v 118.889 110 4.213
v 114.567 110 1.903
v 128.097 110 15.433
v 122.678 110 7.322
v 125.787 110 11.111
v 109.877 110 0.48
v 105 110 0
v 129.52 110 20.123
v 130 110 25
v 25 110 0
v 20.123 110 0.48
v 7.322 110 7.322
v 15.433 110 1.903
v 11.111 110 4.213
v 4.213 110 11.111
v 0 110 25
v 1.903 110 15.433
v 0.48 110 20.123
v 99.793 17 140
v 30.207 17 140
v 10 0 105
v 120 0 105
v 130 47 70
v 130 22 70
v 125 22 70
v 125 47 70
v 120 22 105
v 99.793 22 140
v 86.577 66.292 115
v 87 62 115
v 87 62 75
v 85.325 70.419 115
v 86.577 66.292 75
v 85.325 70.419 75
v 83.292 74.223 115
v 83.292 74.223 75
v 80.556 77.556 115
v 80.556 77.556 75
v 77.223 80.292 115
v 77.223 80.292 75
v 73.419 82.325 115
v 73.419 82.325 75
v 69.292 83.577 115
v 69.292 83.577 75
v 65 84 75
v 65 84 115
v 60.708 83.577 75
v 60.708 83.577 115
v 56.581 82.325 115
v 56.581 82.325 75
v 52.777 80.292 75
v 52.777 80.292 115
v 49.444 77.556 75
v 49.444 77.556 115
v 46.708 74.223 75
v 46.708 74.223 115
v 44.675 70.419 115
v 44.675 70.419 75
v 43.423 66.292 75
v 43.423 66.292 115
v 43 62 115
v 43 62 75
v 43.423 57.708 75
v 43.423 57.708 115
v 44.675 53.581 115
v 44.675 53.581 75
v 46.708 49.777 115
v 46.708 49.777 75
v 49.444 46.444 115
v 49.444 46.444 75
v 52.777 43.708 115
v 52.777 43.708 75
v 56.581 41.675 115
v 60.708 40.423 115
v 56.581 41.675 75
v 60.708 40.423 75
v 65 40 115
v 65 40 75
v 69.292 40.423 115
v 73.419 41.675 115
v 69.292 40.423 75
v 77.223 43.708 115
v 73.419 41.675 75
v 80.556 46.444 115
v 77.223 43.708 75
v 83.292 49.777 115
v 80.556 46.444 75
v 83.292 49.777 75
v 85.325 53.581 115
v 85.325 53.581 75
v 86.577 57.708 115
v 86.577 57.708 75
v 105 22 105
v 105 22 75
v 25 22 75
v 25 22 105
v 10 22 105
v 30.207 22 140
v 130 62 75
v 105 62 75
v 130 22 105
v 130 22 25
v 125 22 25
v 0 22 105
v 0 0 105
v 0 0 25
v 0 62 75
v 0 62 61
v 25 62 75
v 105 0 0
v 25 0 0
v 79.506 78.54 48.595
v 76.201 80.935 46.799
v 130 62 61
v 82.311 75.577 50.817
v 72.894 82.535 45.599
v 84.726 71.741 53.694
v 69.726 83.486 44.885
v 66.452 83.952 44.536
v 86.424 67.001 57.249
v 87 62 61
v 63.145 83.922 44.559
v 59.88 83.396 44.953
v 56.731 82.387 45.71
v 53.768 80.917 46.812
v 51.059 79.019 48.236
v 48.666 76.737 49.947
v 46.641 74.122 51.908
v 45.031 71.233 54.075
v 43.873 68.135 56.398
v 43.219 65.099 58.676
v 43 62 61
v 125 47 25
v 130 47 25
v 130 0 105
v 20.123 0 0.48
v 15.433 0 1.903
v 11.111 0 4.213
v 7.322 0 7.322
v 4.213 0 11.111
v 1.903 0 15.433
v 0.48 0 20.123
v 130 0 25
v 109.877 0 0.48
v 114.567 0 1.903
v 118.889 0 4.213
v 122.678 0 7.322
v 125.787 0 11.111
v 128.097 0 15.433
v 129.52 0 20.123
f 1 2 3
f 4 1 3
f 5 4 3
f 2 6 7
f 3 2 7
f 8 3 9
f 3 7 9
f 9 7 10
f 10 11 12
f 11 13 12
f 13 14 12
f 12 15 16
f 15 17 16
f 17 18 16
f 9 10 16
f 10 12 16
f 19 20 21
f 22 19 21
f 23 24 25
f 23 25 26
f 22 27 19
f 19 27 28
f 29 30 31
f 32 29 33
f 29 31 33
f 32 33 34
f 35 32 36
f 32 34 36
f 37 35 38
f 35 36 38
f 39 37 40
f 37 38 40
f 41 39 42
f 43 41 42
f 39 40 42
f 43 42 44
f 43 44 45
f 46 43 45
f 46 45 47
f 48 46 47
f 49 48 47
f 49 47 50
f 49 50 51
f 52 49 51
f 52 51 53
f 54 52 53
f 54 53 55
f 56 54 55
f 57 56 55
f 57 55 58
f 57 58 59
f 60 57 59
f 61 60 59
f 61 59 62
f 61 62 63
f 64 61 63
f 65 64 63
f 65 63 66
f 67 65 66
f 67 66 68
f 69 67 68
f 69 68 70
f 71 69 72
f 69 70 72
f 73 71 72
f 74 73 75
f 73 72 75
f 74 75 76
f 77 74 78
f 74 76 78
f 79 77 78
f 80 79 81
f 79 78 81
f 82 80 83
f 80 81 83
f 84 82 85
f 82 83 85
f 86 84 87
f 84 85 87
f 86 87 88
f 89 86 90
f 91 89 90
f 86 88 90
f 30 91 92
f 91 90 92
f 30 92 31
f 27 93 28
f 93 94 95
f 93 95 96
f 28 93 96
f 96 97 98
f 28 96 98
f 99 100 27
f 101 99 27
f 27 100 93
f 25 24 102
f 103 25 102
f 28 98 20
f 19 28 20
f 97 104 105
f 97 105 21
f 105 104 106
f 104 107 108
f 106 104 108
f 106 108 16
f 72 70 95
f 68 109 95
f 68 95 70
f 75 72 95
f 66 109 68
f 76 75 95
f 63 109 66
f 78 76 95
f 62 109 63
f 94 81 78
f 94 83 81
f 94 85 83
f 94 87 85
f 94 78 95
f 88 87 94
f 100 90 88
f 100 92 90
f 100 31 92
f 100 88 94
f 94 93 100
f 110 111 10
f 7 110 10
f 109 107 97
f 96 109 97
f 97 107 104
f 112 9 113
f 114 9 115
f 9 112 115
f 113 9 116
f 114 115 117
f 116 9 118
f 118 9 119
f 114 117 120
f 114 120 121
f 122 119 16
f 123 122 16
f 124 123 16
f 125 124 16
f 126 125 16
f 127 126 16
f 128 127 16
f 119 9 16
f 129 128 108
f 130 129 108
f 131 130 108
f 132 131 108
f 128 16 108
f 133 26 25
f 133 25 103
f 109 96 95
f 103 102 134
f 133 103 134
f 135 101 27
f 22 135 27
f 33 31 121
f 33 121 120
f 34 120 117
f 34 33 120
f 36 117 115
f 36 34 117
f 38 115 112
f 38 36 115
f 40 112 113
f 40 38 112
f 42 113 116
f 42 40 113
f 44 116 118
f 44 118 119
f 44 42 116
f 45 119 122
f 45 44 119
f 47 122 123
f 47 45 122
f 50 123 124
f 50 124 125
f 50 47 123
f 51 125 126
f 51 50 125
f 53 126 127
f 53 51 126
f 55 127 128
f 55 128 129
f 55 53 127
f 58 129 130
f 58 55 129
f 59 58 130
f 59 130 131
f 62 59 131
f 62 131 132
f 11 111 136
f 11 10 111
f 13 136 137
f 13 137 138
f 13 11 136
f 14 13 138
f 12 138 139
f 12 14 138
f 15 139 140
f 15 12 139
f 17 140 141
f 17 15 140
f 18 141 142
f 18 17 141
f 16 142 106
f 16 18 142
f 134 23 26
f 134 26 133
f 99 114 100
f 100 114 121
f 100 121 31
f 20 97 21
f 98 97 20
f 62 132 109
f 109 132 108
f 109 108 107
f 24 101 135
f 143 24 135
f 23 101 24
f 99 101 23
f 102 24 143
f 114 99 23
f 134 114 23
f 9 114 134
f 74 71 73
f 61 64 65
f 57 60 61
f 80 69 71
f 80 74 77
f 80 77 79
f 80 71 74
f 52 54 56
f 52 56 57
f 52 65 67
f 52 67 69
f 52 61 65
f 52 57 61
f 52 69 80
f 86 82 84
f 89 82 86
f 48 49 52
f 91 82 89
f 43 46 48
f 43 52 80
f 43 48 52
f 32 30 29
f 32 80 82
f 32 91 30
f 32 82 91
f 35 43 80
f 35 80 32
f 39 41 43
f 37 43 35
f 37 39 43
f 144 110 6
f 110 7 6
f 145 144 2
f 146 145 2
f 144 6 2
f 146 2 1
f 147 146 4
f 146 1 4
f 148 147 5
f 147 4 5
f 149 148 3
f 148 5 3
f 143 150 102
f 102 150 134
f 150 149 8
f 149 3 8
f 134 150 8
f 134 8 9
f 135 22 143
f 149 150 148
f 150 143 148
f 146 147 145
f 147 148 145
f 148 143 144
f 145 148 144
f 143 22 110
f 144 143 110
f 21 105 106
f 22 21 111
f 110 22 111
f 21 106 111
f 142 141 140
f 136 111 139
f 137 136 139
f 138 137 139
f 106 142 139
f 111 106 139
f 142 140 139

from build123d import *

# Parameters (mm, degrees)
EXTRUDE1_DEPTH             = 130
FILLET1_R                  = 25
EXTRUDE2_DEPTH             = 130
SKETCH3_W                  = 45
SKETCH3_H                  = 25
EXTRUDE3_DEPTH             = 5
SKETCH4_W                  = 80
SKETCH4_H                  = 30
EXTRUDE4_DEPTH             = 40
SKETCH5_R                  = 22
EXTRUDE5_DEPTH             = 40
EXTRUDE5_DIRECTION_2_REACH = 77


with BuildPart() as part:
    # Sketch1 → Extrude1 (new body)
    with BuildSketch(Plane(origin=(0, 0, 0), x_dir=(0, 0, -1), z_dir=(1, 0, 0))):
        Polygon((0, 0), (0, 110), (-25, 110), (-61, 62), (-75, 62), (-105, 22), (-140, 22), (-140, 17), (-105, 0), align=None)
    extrude(amount=EXTRUDE1_DEPTH)

    # Fillet1
    fillet1_edges = [part.edges().sort_by_distance(p)[0] for p in [
        (0, 55, 0),
        (130, 55, 0),
    ]]
    fillet(fillet1_edges, radius=FILLET1_R)

    # Sketch2 → Extrude2 (cut)
    with BuildSketch(Plane(origin=(0, 22, 0), x_dir=(1, 0, 0), z_dir=(0, 1, 0))):
        Polygon((99.792740578, -140), (130, -140), (130, -105), (120, -105), align=None)
        Polygon((10, -105), (30.207259422, -140), (0, -140), (0, -105), align=None)
    extrude(amount=-EXTRUDE2_DEPTH, mode=Mode.SUBTRACT)

    # Sketch3 → Extrude3 (cut)
    with BuildSketch(Plane(origin=(130, 0, 0), x_dir=(0, 0, -1), z_dir=(1, 0, 0))):
        with Locations((-47.5, 34.5)):
            Rectangle(SKETCH3_W, SKETCH3_H)
    extrude(amount=-EXTRUDE3_DEPTH, mode=Mode.SUBTRACT)

    # Sketch4 → Extrude4 (cut)
    with BuildSketch(Plane(origin=(0, 62, 0), x_dir=(1, 0, 0), z_dir=(0, 1, 0))):
        with Locations((65, -90)):
            Rectangle(SKETCH4_W, SKETCH4_H)
    extrude(amount=-EXTRUDE4_DEPTH, mode=Mode.SUBTRACT)

    # Sketch5 → Extrude5 (add)
    with BuildSketch(Plane.XY.offset(75)):
        with Locations((65, 62)):
            Circle(SKETCH5_R)
    extrude(amount=EXTRUDE5_DEPTH)

    # Extrude5 direction 2: up to this face of the body (flat: up to its plane)
    extrude5_direction_2_end = Plane(part.part.faces().sort_by_distance((65, 86, 43))[0])
    # Sketch5 → Extrude5 direction 2 (add, up to the picked face)
    with BuildSketch(Plane.XY.offset(75), mode=Mode.PRIVATE) as extrude5_direction_2_sk1:
        with Locations((65, 62)):
            Circle(SKETCH5_R)
    extrude5_direction_2_tool1 = split(extrude(extrude5_direction_2_sk1.sketch, amount=-EXTRUDE5_DIRECTION_2_REACH, mode=Mode.PRIVATE), bisect_by=extrude5_direction_2_end, keep=Keep.BOTH, mode=Mode.PRIVATE)
    add(extrude5_direction_2_tool1.solids().sort_by(Axis((65, 62, 75), (0, 0, -1)))[0])


solid = part.part
